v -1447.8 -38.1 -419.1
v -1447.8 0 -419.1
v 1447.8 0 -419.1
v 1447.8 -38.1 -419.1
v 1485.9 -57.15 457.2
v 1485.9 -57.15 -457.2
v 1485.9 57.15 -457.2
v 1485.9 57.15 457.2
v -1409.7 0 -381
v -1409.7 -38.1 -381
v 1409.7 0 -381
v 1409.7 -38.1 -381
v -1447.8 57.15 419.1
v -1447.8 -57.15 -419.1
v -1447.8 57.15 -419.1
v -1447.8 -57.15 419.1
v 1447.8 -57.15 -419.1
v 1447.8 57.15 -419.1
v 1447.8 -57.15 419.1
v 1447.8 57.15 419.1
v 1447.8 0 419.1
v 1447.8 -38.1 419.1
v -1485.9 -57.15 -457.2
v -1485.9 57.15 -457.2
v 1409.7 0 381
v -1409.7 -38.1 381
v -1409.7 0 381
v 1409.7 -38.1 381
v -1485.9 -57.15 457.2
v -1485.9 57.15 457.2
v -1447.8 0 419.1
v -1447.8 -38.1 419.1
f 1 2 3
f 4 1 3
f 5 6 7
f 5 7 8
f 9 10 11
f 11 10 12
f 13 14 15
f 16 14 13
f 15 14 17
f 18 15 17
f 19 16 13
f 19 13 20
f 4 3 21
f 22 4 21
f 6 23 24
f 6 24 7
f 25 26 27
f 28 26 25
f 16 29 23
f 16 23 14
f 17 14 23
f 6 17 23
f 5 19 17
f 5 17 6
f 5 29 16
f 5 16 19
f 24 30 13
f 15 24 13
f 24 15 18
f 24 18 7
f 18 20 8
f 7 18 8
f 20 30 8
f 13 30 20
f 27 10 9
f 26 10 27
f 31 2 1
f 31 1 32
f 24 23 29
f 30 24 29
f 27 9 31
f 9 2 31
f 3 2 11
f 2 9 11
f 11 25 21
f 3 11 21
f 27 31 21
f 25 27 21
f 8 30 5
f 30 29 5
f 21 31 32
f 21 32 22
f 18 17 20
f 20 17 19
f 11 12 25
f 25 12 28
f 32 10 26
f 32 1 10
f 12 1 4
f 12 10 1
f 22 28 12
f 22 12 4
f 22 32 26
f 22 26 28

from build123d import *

# Parameters (mm, degrees)
F0_W      = 2971.8
F0_H      = 914.4
F1_DEPTH  = 57.15
F2_W      = 2895.6
F2_H      = 838.2
F3_DEPTH  = 114.301
F4_W      = 2895.6
F4_H      = 838.2
F5_DEPTH  = 38.1
F6_W      = 2819.4
F6_H      = 762
F7_DEPTH  = 95.251
F8_W      = 1466.85
F8_H      = 838.2
F9_DEPTH  = 38.1
F10_W     = 38.1
F10_H     = 762
F11_DEPTH = 57.151


with BuildPart() as f1:
    # F0 (on Front) → F1 (new body, symmetric)
    with BuildSketch(Plane.XZ):
        Rectangle(F0_W, F0_H)
    extrude(amount=F1_DEPTH, both=True)

    # F2 (on face) → F3 (cut, through all)
    with BuildSketch(Plane.XZ.offset(57.15)):
        Rectangle(F2_W, F2_H)
    extrude(amount=-F3_DEPTH, mode=Mode.SUBTRACT)


with BuildPart() as f5:
    # F4 (on Front) → F5 (new body)
    with BuildSketch(Plane.XZ):
        Rectangle(F4_W, F4_H)
    extrude(amount=F5_DEPTH)

    # F6 (on face) → F7 (cut, through all)
    with BuildSketch(Plane.XZ.offset(38.1)):
        Rectangle(F6_W, F6_H)
    extrude(amount=-F7_DEPTH, mode=Mode.SUBTRACT)


with BuildPart() as f9:
    # F8 (on Front) → F9 (new body)
    with BuildSketch(Plane.XZ):
        with Locations((714.375, 0)):
            Rectangle(F8_W, F8_H)
    extrude(amount=-F9_DEPTH)

    # F10 (on face) → F11 (cut, through all)
    with BuildSketch(Plane.XZ):
        with Locations((1428.75, 0)):
            Rectangle(F10_W, F10_H)
    extrude(amount=-F11_DEPTH, mode=Mode.SUBTRACT)


solid = Compound([f1.part, f5.part])
